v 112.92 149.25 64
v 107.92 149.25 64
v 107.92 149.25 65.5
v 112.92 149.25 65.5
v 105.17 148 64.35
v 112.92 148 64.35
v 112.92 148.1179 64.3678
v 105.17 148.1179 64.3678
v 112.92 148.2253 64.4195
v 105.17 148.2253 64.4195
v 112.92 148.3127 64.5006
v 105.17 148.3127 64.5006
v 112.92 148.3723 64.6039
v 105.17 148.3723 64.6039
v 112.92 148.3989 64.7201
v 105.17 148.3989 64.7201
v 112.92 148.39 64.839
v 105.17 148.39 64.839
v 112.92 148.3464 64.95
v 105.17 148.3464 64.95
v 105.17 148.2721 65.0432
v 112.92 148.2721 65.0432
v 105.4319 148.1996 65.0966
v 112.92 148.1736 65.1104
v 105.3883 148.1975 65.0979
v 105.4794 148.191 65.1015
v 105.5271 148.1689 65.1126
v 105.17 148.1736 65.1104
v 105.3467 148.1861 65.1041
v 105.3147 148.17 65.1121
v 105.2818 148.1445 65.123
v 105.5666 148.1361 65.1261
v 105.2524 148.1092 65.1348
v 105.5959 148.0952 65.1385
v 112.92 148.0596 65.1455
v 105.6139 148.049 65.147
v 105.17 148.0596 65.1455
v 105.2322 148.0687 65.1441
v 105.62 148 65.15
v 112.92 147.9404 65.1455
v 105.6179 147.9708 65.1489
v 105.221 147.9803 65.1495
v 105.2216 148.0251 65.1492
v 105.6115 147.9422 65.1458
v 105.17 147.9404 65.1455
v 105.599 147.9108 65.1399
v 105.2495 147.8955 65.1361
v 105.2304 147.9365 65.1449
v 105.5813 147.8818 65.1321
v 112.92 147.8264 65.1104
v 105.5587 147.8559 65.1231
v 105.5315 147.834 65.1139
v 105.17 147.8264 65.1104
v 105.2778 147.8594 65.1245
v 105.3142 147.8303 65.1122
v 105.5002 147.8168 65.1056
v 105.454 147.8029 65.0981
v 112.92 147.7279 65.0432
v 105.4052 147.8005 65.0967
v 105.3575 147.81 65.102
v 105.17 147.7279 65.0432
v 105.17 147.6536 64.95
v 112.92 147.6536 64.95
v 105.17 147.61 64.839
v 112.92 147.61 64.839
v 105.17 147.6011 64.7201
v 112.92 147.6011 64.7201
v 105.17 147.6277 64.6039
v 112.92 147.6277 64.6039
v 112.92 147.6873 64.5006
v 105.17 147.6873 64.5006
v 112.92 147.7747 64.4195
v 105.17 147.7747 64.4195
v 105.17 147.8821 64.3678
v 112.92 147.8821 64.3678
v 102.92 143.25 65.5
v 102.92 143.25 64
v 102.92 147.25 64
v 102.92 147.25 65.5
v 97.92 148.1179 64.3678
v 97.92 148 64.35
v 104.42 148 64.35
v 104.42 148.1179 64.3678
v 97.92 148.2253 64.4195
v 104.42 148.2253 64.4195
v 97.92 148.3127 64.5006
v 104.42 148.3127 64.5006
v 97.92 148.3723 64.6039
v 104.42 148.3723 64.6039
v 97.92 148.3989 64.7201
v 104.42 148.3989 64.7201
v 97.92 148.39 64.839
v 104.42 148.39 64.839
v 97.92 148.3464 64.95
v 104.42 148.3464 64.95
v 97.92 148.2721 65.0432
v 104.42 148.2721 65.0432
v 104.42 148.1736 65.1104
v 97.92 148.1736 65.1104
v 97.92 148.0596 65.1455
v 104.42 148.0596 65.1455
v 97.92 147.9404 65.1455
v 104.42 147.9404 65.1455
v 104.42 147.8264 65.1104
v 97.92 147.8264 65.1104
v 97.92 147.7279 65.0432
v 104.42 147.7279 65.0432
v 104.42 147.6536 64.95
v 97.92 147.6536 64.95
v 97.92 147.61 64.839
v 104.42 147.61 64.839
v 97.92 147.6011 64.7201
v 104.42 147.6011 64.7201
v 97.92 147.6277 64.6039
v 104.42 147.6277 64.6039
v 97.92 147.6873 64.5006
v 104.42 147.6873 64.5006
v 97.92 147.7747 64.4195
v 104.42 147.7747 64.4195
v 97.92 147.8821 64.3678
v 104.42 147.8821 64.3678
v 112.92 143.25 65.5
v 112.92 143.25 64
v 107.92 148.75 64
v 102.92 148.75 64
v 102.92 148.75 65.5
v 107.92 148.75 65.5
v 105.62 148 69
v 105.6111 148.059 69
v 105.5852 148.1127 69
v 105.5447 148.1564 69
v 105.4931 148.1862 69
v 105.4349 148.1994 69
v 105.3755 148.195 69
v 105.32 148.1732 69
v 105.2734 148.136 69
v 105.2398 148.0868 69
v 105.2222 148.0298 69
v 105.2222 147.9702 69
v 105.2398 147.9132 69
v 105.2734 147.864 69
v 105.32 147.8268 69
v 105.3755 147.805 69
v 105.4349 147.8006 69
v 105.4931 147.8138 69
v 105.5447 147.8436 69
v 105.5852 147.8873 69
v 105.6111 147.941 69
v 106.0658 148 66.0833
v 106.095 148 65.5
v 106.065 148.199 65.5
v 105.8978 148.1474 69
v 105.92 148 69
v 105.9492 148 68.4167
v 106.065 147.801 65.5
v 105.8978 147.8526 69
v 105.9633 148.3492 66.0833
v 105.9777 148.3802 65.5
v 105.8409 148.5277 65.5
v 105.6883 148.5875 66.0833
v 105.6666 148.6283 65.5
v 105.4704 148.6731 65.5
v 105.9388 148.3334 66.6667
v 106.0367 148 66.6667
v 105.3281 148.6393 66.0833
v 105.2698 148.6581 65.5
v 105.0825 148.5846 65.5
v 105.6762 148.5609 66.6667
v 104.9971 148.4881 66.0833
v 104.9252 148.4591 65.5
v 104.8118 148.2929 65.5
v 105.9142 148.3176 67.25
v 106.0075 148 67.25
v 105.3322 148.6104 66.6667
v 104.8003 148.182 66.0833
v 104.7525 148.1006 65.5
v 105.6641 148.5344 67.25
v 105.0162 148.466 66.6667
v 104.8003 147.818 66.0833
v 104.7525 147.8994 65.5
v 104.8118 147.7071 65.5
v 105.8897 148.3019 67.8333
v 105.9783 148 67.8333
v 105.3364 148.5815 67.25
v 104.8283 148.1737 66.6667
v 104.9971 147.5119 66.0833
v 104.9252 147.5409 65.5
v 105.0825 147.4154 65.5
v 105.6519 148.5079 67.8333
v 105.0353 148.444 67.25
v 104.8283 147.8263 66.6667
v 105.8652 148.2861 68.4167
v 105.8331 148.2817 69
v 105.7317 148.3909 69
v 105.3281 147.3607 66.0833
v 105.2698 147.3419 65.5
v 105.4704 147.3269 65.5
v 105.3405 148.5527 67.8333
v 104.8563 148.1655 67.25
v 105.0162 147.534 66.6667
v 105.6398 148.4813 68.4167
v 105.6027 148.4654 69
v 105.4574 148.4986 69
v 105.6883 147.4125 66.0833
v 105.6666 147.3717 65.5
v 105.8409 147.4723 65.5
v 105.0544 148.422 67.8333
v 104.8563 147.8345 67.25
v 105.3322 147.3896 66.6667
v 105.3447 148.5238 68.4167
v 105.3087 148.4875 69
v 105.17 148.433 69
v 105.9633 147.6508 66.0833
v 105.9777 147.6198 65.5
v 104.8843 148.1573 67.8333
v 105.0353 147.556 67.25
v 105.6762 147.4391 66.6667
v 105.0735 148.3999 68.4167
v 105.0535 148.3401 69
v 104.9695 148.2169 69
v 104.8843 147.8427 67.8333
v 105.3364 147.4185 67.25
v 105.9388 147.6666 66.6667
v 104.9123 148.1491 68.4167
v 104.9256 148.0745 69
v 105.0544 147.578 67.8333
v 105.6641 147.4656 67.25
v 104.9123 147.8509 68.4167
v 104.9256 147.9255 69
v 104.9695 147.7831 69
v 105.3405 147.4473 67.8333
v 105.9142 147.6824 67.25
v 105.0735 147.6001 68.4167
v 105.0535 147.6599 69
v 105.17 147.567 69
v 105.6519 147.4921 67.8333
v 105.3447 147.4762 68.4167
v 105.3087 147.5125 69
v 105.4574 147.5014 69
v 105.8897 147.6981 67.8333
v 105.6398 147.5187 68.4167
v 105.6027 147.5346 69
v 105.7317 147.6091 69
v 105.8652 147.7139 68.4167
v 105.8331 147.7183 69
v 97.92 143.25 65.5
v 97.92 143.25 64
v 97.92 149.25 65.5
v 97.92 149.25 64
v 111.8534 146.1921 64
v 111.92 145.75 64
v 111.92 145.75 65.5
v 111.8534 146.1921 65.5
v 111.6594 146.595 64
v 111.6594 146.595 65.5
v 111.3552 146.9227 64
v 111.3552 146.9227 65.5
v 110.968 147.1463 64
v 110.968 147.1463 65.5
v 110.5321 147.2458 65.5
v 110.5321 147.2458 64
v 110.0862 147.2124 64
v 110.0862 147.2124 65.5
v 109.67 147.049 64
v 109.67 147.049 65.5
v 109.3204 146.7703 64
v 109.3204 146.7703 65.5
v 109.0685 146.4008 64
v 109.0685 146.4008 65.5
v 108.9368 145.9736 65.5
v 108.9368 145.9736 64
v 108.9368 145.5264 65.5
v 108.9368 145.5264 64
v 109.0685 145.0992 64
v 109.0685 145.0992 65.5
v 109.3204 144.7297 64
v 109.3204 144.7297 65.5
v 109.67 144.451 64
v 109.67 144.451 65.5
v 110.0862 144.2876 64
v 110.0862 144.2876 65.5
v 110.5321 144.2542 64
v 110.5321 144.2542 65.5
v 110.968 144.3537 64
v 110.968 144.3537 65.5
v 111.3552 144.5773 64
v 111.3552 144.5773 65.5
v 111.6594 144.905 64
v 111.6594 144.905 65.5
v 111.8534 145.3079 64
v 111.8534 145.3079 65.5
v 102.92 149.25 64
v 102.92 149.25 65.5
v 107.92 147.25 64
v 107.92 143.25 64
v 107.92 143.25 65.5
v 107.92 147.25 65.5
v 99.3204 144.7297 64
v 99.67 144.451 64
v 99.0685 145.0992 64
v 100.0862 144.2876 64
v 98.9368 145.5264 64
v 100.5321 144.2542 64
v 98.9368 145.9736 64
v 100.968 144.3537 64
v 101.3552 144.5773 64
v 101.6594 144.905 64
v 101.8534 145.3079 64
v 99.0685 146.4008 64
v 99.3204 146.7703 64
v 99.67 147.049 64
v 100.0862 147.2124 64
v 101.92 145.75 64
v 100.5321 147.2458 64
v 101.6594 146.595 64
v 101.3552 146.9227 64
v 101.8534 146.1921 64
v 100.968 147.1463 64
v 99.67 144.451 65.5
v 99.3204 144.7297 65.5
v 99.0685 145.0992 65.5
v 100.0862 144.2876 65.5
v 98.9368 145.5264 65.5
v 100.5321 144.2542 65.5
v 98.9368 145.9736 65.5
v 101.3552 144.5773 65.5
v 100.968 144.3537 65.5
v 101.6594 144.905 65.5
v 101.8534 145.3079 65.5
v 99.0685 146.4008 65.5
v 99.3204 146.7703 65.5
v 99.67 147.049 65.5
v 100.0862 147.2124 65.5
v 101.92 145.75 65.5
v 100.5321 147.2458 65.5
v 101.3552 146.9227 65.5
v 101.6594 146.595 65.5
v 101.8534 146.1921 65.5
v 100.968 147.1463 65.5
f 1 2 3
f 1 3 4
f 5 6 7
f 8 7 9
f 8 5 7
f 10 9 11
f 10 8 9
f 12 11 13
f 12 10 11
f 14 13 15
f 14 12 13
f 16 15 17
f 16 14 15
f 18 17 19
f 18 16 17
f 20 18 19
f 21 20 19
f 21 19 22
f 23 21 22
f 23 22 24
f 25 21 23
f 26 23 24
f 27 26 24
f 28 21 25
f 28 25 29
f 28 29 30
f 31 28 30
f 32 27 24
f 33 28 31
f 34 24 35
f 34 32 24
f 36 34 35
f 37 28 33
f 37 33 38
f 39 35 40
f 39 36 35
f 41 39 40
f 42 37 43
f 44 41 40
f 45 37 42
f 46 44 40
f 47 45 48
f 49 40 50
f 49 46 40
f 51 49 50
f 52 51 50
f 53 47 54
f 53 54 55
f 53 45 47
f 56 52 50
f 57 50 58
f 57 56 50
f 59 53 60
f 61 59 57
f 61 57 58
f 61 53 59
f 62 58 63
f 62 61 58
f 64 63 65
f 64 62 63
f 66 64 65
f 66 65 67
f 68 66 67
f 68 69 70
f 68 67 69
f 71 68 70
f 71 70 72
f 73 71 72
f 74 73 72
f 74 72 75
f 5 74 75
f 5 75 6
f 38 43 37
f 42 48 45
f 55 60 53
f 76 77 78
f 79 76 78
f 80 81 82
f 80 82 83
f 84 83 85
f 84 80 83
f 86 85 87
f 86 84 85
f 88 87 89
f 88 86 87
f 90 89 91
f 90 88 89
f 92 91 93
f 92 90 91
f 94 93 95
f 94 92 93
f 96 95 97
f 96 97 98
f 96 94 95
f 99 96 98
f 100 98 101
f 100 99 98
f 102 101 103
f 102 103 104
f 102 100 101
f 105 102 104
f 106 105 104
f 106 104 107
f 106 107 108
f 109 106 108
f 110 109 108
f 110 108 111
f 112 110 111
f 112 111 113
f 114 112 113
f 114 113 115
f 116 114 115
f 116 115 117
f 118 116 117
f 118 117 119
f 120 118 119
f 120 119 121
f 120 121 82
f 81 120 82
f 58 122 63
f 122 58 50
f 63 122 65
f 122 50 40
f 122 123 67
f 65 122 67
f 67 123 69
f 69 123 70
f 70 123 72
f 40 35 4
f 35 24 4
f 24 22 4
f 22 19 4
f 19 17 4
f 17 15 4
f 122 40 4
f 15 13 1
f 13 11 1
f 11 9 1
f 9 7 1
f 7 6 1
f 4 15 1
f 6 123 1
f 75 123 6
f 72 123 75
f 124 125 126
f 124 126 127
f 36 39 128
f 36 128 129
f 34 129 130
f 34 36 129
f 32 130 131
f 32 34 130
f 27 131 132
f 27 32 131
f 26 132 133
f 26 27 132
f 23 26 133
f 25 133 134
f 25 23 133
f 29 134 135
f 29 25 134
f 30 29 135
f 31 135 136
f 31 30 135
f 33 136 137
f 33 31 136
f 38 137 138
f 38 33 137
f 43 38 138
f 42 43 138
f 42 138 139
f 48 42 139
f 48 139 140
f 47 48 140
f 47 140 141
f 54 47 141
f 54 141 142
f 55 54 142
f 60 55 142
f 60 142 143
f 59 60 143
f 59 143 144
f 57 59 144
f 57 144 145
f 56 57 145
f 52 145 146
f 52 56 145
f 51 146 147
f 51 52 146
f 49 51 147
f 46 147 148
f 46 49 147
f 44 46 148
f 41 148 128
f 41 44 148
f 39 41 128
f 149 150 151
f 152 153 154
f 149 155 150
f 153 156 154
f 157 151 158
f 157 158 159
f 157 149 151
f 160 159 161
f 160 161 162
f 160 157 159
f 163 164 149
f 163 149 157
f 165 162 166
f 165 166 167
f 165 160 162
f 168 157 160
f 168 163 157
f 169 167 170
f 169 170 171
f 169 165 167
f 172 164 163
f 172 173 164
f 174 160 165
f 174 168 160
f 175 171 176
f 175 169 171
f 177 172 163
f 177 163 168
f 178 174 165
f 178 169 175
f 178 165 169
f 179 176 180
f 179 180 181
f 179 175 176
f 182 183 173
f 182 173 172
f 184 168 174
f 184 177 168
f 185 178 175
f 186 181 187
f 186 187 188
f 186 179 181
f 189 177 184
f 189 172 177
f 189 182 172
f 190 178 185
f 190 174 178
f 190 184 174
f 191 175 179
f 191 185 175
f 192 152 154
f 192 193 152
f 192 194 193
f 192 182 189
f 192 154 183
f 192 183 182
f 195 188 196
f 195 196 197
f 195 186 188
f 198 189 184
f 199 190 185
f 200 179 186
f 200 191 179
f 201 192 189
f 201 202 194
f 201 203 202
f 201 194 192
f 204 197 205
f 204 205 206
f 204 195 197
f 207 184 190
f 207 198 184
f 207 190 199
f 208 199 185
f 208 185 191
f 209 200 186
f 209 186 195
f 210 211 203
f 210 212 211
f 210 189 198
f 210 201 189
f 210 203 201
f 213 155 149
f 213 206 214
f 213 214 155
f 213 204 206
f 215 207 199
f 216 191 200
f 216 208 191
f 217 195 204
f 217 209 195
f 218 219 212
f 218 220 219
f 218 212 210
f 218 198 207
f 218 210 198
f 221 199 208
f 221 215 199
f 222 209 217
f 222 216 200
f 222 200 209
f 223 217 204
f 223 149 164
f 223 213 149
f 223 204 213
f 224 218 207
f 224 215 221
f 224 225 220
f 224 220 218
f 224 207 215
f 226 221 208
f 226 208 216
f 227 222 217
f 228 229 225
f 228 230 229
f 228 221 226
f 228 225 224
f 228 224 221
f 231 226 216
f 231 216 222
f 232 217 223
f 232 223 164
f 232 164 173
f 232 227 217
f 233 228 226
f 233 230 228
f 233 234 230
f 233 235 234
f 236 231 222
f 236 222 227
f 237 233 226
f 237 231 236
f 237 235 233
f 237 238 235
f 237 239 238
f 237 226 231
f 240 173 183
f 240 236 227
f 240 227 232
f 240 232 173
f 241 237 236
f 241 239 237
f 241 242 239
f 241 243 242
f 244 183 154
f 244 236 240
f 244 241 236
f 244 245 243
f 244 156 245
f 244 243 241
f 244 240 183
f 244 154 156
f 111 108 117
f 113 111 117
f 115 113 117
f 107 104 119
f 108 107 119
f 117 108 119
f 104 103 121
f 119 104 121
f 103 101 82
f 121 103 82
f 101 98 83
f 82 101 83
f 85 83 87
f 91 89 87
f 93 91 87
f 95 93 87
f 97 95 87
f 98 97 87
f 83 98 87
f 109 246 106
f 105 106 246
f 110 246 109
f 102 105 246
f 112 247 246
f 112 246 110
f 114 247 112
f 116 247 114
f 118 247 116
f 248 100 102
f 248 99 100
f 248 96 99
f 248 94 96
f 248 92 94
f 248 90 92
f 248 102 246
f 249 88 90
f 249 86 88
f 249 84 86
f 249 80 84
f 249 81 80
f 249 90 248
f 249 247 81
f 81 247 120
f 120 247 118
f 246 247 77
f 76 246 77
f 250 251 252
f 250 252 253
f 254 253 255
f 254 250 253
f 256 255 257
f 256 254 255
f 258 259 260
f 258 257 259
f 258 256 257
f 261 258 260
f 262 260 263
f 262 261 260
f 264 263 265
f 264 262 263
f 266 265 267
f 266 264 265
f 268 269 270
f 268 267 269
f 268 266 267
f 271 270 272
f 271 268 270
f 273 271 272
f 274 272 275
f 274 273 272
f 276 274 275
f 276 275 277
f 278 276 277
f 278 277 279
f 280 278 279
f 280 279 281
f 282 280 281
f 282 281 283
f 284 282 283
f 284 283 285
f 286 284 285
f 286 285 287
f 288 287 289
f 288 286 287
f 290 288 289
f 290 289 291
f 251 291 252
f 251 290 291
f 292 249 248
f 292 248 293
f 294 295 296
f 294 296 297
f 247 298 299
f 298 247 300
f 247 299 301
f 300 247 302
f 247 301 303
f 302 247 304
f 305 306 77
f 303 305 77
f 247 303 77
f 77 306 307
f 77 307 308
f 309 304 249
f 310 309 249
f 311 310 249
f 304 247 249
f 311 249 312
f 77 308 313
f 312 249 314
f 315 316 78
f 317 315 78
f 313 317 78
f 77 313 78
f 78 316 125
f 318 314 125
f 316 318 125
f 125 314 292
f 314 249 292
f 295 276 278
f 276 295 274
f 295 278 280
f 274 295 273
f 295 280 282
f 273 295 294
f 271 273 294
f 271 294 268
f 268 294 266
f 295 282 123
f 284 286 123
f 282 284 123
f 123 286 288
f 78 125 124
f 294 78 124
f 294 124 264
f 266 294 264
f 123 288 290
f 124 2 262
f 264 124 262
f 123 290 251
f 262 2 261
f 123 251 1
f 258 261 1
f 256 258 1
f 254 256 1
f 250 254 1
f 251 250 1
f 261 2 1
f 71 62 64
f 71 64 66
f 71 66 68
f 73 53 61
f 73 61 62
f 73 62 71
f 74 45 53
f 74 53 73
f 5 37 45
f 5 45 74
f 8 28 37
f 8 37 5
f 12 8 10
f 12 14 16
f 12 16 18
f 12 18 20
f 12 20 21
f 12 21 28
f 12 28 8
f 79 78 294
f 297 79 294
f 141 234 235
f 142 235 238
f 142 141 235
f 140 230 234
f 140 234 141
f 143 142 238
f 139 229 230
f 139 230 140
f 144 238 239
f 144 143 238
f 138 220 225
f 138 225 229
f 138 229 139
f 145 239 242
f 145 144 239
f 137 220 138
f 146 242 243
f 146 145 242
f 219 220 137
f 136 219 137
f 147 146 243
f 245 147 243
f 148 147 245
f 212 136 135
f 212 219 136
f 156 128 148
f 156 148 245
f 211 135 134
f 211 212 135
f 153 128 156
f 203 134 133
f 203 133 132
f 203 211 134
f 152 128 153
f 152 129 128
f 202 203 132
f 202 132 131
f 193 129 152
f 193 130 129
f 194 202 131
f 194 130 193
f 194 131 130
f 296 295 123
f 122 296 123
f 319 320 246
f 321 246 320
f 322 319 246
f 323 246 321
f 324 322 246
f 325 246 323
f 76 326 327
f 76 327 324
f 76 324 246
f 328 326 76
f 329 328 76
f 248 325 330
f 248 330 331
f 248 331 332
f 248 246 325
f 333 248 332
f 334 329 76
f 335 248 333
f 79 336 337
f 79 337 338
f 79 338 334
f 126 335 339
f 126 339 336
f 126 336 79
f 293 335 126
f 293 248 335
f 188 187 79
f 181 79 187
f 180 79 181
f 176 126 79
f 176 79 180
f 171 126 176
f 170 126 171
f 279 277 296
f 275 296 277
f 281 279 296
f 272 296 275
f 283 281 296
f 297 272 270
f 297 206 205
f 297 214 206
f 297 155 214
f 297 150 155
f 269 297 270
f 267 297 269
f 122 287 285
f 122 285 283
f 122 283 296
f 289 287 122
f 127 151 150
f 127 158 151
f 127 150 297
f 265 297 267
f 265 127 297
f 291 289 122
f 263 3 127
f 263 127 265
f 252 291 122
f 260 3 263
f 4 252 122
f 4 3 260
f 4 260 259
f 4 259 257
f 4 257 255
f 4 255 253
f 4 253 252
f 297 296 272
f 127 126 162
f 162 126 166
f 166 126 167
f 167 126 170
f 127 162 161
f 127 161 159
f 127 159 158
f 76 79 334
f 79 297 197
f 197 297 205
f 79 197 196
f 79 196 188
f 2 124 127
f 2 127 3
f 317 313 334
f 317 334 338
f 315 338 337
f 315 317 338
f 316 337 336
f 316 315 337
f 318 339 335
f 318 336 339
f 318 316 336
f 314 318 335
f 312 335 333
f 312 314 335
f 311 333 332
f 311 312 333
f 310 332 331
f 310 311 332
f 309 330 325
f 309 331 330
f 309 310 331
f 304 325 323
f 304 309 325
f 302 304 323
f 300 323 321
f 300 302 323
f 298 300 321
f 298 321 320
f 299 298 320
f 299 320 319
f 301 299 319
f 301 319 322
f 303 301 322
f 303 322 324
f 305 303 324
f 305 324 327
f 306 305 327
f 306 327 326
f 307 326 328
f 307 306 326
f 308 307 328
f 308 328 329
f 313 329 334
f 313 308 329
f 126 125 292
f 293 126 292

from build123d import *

# Parameters (mm, degrees)
CYLINDER140_R           = 1.5
CYLINDER140_DEPTH       = 8
CYLINDER138_R           = 0.4
CYLINDER138_DEPTH       = 8
CYLINDER138_PITCH_ANGLE = 90
CYLINDER139_R           = 0.4
CYLINDER139_DEPTH       = 10
CYLINDER139_PITCH_ANGLE = 90
CYLINDER136_R           = 0.2
CYLINDER136_DEPTH       = 9
CYLINDER141_R           = 1.5
CYLINDER141_DEPTH       = 8
BOX028_W                = 5
BOX028_H                = 6
BOX028_DEPTH            = 1.5
BOX027_W                = 5
BOX027_H                = 6
BOX027_DEPTH            = 1.5
BOX026_W                = 5
BOX026_H                = 1.5
BOX026_DEPTH            = 1.5


with BuildPart() as bowtiemount003:
    # Cylinder140 → Cylinder140 (new body)
    with BuildSketch(Plane(origin=(127, 146.25, 63), x_dir=(1, 0, 0), z_dir=(0, 0, 1))):
        Circle(CYLINDER140_R)
    extrude(amount=CYLINDER140_DEPTH)


with BuildPart() as bowtieinjectorwire1:
    # Cylinder138 → Cylinder138 (new body)
    with BuildSketch(Plane.XY):
        Circle(CYLINDER138_R)
    extrude(amount=CYLINDER138_DEPTH)


with BuildPart() as bowtieinjectorwire1_1:
    # Cylinder138 pitch: moved
    add(bowtieinjectorwire1.part.rotate(Axis((0, 0, 0), (0, 1, 0)), CYLINDER138_PITCH_ANGLE))


with BuildPart() as bowtieinjectorwire1_2:
    # Cylinder138 placement: moved
    add(bowtieinjectorwire1_1.part.moved(Location((121.75, 148.5, 69.75))))


with BuildPart() as bowtieinjectorwire002:
    # Cylinder139 → Cylinder139 (new body)
    with BuildSketch(Plane.XY):
        Circle(CYLINDER139_R)
    extrude(amount=CYLINDER139_DEPTH)


with BuildPart() as bowtieinjectorwire002_1:
    # Cylinder139 pitch: moved
    add(bowtieinjectorwire002.part.rotate(Axis((0, 0, 0), (0, 1, 0)), CYLINDER139_PITCH_ANGLE))


with BuildPart() as bowtieinjectorwire002_2:
    # Cylinder139 placement: moved
    add(bowtieinjectorwire002_1.part.moved(Location((111, 148.5, 69.75))))


with BuildPart() as bowtienozzle004:
    # Cylinder136 → Cylinder136 (new body)
    with BuildSketch(Plane(origin=(122, 148.5, 69.5), x_dir=(1, 0, 0), z_dir=(0, 0, 1))):
        Circle(CYLINDER136_R)
    extrude(amount=CYLINDER136_DEPTH)


with BuildPart() as bowtiecut:
    # Cylinder141 → Cylinder141 (new body)
    with BuildSketch(Plane(origin=(117, 146.25, 63), x_dir=(1, 0, 0), z_dir=(0, 0, 1))):
        Circle(CYLINDER141_R)
    extrude(amount=CYLINDER141_DEPTH)

    # Fusion055: union BowTieMount003, BowTieInjectorWire1, BowTieInjectorWire002, BowTieNozzle004
    add(bowtiemount003.part)
    add(bowtieinjectorwire1_2.part)
    add(bowtieinjectorwire002_2.part)
    add(bowtienozzle004.part)


with BuildPart() as cone001:
    # Cone001 → Cone001 (revolve)
    with BuildSketch(Plane(origin=(122, 148.5, 70), x_dir=(1, 0, 0), z_dir=(0, -1, 0))):
        Polygon((0, 0), (0.7, 0), (0.5, 4), (0, 4), align=None)
    revolve(axis=Axis((122, 148.5, 70), (0, 0, 1)))


with BuildPart() as cube011:
    # Box028 → Box028 (new body)
    with BuildSketch(Plane(origin=(114.5, 143.75, 69), x_dir=(1, 0, 0), z_dir=(0, 0, 1))):
        with Locations((2.5, 3)):
            Rectangle(BOX028_W, BOX028_H)
    extrude(amount=BOX028_DEPTH)


with BuildPart() as cube010:
    # Box027 → Box027 (new body)
    with BuildSketch(Plane(origin=(124.5, 143.75, 69), x_dir=(1, 0, 0), z_dir=(0, 0, 1))):
        with Locations((2.5, 3)):
            Rectangle(BOX027_W, BOX027_H)
    extrude(amount=BOX027_DEPTH)


with BuildPart() as bowtie:
    # Box026 → Box026 (new body)
    with BuildSketch(Plane(origin=(119.5, 147.75, 69), x_dir=(1, 0, 0), z_dir=(0, 0, 1))):
        with Locations((2.5, 0.75)):
            Rectangle(BOX026_W, BOX026_H)
    extrude(amount=BOX026_DEPTH)

    # Fusion056: union Cone001, Cube011, Cube010
    add(cone001.part)
    add(cube011.part)
    add(cube010.part)

    # Cut018: cut BowTieCut
    add(bowtiecut.part, mode=Mode.SUBTRACT)


with BuildPart() as bowtie_1:
    # Cut018 placement: moved
    add(bowtie.part.moved(Location((-16.58, -0.5, -5))))


solid = bowtie_1.part
